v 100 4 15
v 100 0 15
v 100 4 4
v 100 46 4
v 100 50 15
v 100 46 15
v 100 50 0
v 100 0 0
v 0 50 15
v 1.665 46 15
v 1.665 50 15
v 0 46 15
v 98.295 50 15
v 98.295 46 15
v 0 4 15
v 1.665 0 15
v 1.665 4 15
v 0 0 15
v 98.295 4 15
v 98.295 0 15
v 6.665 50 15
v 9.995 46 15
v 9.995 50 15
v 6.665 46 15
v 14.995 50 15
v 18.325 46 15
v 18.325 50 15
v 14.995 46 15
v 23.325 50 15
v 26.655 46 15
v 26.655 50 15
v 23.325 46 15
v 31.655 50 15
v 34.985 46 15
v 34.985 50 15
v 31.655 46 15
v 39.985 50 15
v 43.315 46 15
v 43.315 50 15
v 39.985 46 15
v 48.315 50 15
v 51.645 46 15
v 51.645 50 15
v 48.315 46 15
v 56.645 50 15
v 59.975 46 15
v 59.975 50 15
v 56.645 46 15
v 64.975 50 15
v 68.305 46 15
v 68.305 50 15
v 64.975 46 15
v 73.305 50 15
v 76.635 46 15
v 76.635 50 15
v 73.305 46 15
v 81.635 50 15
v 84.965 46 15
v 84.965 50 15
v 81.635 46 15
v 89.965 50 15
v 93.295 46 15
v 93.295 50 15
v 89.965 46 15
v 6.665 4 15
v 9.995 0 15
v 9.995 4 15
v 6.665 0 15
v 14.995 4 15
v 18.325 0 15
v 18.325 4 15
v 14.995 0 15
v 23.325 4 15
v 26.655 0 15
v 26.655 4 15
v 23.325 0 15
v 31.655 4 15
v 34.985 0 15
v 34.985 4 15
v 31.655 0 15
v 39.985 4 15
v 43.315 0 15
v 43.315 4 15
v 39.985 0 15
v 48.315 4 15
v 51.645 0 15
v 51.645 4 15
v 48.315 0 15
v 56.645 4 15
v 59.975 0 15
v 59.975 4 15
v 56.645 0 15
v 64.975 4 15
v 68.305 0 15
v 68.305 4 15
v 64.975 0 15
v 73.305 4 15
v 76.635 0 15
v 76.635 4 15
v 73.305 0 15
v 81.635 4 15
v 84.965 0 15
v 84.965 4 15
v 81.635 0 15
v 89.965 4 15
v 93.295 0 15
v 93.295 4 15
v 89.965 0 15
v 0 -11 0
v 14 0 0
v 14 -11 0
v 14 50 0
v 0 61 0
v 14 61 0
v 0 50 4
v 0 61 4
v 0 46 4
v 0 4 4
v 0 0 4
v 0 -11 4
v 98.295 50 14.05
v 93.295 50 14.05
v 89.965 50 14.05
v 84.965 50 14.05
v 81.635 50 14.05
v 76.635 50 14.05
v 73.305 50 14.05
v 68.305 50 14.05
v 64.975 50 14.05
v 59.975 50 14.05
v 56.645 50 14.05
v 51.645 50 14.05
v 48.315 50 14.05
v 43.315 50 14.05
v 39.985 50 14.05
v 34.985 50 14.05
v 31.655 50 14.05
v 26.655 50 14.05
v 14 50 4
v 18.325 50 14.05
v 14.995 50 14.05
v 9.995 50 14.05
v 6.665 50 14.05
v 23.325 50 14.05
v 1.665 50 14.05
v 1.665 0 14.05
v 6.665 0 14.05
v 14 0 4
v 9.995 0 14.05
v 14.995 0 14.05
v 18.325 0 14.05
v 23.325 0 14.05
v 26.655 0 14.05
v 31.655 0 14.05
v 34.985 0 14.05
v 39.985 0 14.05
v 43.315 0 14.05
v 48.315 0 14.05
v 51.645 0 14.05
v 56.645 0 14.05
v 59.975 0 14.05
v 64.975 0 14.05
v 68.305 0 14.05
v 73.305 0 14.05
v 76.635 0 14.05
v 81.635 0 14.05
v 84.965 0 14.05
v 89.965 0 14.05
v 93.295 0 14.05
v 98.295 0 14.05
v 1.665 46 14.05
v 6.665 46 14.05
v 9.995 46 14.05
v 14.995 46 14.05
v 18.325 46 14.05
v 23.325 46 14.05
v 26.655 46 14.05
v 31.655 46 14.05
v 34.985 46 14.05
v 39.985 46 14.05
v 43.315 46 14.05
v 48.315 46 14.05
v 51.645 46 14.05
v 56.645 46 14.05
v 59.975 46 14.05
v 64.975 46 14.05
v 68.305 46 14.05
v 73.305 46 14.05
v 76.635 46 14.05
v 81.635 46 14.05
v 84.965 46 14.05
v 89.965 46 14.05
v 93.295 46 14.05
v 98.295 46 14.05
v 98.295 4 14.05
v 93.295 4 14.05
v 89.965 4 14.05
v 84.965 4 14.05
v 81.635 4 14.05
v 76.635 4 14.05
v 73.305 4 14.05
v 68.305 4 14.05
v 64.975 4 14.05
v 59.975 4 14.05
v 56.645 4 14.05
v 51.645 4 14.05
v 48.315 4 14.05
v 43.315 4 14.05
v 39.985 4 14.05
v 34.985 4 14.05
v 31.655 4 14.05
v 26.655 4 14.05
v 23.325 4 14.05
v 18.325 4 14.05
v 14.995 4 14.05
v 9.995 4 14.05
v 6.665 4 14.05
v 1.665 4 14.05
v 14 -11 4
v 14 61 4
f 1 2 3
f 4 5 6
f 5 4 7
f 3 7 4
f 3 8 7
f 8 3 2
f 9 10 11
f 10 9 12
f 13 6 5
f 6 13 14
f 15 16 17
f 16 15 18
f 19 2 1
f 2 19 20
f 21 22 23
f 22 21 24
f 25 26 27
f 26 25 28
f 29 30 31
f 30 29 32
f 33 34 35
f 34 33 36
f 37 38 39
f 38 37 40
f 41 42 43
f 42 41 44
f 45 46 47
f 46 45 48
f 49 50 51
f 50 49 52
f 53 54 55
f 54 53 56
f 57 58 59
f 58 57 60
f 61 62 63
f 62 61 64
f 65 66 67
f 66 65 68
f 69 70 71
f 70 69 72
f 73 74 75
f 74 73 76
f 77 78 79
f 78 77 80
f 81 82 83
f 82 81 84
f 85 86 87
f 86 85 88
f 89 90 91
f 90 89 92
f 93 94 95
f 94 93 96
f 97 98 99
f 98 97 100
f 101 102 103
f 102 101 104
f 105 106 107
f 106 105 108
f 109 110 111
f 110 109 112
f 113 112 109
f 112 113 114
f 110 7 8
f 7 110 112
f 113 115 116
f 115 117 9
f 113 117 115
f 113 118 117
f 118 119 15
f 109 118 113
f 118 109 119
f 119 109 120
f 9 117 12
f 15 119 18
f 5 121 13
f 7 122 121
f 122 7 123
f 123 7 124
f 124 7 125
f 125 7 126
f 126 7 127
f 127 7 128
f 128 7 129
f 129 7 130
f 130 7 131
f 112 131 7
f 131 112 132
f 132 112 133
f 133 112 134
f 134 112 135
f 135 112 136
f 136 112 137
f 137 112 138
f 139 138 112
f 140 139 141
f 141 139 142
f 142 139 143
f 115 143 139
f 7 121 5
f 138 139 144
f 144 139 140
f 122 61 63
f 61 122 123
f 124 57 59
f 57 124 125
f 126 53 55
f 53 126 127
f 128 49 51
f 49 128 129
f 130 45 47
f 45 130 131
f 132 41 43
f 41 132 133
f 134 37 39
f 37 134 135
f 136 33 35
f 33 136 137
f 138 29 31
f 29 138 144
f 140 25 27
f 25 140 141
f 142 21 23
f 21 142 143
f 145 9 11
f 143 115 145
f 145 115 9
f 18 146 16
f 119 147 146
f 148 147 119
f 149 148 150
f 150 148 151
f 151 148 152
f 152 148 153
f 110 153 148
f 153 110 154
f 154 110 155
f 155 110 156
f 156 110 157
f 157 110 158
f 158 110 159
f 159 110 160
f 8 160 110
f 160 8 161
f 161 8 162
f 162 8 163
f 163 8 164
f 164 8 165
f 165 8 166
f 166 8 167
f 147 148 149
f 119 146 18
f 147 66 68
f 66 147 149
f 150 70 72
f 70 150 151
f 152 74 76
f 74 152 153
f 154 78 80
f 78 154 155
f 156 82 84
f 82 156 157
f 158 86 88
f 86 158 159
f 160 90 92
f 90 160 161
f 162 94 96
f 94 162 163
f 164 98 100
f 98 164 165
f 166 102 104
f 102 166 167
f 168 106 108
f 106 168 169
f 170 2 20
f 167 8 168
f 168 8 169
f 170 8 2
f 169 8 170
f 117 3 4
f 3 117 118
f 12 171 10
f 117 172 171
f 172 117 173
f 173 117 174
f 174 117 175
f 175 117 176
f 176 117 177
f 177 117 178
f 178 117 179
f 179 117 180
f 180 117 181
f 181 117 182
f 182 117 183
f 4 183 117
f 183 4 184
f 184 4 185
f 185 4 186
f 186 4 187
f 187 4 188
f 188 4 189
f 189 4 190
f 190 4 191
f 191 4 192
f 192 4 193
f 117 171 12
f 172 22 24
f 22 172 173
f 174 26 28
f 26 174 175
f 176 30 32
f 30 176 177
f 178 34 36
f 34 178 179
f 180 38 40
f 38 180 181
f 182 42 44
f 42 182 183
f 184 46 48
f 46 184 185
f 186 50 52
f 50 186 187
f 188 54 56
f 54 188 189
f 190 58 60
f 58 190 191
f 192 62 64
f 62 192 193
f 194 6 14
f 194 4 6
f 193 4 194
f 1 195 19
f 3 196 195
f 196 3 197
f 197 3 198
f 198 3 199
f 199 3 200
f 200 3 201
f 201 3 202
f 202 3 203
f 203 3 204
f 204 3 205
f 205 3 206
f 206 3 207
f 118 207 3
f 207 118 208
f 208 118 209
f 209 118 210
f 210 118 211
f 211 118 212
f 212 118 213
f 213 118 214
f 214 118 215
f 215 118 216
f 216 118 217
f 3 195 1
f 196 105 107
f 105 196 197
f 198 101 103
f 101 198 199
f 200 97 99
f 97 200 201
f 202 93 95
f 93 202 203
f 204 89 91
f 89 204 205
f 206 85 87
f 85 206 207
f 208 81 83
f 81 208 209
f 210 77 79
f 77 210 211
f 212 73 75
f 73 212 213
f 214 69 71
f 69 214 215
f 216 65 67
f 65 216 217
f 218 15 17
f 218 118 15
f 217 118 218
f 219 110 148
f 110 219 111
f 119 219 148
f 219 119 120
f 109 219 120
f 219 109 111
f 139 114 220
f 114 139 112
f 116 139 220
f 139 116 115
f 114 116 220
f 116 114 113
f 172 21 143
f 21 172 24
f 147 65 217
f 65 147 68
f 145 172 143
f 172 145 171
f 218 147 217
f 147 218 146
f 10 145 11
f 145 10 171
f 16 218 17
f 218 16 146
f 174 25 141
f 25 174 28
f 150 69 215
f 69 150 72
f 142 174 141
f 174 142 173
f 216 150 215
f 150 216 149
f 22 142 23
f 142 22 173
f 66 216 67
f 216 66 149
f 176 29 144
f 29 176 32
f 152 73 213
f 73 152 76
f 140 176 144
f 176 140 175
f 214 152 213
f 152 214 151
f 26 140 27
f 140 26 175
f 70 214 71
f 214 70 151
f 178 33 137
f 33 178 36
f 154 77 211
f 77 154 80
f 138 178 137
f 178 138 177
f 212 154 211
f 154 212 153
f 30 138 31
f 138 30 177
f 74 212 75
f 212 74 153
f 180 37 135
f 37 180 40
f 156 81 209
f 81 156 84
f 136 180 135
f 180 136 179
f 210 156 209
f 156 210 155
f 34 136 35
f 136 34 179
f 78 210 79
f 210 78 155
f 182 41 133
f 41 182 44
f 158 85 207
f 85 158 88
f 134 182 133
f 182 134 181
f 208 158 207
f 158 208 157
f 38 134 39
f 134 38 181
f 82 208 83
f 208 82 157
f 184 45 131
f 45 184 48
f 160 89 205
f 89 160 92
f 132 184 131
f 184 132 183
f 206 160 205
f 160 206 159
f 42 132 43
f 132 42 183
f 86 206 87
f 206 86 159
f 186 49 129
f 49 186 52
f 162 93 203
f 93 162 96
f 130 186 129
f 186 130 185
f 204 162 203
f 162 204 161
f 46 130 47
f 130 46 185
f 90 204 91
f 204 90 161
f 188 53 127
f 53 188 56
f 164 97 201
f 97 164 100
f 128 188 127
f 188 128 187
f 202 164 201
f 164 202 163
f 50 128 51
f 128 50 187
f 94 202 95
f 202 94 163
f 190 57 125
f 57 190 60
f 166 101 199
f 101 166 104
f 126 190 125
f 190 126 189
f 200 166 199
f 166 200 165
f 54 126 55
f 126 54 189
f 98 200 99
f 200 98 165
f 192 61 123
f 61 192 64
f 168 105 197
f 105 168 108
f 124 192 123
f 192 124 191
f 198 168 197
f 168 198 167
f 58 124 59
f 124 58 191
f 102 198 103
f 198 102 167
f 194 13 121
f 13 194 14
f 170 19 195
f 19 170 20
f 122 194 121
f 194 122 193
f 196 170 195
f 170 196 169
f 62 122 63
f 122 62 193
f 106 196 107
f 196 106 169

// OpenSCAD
$fn = 32;

// ----------------------------------------------------------------------
// Cable duct: 100 x 50 x 15 mm, 12 fingers
// ----------------------------------------------------------------------

// --- parameters (mm) ---
tray_len = 100;           // duct length, X
tray_w = 50;              // duct width, Y
tray_h = 15;              // duct height, Z
tray_t = 4;               // side wall thickness
floor_t = 4;              // floor thickness
slot_w = 5;               // finger slot width
slot_h = 10.05;           // finger slot height
fingers = 12;             // number of finger slots per side
pitch = 8.33;             // finger pitch
ear_w = 12;               // mounting ear width
ear_l = 14;               // mounting ear length

module shell() {
  difference() {
    cube([tray_len, tray_w, tray_h]);
    /* open top channel */
    translate([-tray_t - 1, tray_t, floor_t])
      cube([tray_len + 2 * tray_t + 2, tray_w - 2 * tray_t, tray_h + 1]);
  }
}

module ears() {
  translate([0, -ear_w + 1, 0]) cube([ear_l, ear_w, floor_t]);
  translate([0, tray_w - 1, 0]) cube([ear_l, ear_w, floor_t]);
}

difference() {
  union() {
    shell();
    ears();
  }
  /* finger slots cut through both side walls */
  for (i = [0 : fingers - 1]) translate([pitch / 2 + i * pitch - slot_w / 2, -1, floor_t + slot_h]) cube([slot_w, tray_w + 2, tray_h]);
}
